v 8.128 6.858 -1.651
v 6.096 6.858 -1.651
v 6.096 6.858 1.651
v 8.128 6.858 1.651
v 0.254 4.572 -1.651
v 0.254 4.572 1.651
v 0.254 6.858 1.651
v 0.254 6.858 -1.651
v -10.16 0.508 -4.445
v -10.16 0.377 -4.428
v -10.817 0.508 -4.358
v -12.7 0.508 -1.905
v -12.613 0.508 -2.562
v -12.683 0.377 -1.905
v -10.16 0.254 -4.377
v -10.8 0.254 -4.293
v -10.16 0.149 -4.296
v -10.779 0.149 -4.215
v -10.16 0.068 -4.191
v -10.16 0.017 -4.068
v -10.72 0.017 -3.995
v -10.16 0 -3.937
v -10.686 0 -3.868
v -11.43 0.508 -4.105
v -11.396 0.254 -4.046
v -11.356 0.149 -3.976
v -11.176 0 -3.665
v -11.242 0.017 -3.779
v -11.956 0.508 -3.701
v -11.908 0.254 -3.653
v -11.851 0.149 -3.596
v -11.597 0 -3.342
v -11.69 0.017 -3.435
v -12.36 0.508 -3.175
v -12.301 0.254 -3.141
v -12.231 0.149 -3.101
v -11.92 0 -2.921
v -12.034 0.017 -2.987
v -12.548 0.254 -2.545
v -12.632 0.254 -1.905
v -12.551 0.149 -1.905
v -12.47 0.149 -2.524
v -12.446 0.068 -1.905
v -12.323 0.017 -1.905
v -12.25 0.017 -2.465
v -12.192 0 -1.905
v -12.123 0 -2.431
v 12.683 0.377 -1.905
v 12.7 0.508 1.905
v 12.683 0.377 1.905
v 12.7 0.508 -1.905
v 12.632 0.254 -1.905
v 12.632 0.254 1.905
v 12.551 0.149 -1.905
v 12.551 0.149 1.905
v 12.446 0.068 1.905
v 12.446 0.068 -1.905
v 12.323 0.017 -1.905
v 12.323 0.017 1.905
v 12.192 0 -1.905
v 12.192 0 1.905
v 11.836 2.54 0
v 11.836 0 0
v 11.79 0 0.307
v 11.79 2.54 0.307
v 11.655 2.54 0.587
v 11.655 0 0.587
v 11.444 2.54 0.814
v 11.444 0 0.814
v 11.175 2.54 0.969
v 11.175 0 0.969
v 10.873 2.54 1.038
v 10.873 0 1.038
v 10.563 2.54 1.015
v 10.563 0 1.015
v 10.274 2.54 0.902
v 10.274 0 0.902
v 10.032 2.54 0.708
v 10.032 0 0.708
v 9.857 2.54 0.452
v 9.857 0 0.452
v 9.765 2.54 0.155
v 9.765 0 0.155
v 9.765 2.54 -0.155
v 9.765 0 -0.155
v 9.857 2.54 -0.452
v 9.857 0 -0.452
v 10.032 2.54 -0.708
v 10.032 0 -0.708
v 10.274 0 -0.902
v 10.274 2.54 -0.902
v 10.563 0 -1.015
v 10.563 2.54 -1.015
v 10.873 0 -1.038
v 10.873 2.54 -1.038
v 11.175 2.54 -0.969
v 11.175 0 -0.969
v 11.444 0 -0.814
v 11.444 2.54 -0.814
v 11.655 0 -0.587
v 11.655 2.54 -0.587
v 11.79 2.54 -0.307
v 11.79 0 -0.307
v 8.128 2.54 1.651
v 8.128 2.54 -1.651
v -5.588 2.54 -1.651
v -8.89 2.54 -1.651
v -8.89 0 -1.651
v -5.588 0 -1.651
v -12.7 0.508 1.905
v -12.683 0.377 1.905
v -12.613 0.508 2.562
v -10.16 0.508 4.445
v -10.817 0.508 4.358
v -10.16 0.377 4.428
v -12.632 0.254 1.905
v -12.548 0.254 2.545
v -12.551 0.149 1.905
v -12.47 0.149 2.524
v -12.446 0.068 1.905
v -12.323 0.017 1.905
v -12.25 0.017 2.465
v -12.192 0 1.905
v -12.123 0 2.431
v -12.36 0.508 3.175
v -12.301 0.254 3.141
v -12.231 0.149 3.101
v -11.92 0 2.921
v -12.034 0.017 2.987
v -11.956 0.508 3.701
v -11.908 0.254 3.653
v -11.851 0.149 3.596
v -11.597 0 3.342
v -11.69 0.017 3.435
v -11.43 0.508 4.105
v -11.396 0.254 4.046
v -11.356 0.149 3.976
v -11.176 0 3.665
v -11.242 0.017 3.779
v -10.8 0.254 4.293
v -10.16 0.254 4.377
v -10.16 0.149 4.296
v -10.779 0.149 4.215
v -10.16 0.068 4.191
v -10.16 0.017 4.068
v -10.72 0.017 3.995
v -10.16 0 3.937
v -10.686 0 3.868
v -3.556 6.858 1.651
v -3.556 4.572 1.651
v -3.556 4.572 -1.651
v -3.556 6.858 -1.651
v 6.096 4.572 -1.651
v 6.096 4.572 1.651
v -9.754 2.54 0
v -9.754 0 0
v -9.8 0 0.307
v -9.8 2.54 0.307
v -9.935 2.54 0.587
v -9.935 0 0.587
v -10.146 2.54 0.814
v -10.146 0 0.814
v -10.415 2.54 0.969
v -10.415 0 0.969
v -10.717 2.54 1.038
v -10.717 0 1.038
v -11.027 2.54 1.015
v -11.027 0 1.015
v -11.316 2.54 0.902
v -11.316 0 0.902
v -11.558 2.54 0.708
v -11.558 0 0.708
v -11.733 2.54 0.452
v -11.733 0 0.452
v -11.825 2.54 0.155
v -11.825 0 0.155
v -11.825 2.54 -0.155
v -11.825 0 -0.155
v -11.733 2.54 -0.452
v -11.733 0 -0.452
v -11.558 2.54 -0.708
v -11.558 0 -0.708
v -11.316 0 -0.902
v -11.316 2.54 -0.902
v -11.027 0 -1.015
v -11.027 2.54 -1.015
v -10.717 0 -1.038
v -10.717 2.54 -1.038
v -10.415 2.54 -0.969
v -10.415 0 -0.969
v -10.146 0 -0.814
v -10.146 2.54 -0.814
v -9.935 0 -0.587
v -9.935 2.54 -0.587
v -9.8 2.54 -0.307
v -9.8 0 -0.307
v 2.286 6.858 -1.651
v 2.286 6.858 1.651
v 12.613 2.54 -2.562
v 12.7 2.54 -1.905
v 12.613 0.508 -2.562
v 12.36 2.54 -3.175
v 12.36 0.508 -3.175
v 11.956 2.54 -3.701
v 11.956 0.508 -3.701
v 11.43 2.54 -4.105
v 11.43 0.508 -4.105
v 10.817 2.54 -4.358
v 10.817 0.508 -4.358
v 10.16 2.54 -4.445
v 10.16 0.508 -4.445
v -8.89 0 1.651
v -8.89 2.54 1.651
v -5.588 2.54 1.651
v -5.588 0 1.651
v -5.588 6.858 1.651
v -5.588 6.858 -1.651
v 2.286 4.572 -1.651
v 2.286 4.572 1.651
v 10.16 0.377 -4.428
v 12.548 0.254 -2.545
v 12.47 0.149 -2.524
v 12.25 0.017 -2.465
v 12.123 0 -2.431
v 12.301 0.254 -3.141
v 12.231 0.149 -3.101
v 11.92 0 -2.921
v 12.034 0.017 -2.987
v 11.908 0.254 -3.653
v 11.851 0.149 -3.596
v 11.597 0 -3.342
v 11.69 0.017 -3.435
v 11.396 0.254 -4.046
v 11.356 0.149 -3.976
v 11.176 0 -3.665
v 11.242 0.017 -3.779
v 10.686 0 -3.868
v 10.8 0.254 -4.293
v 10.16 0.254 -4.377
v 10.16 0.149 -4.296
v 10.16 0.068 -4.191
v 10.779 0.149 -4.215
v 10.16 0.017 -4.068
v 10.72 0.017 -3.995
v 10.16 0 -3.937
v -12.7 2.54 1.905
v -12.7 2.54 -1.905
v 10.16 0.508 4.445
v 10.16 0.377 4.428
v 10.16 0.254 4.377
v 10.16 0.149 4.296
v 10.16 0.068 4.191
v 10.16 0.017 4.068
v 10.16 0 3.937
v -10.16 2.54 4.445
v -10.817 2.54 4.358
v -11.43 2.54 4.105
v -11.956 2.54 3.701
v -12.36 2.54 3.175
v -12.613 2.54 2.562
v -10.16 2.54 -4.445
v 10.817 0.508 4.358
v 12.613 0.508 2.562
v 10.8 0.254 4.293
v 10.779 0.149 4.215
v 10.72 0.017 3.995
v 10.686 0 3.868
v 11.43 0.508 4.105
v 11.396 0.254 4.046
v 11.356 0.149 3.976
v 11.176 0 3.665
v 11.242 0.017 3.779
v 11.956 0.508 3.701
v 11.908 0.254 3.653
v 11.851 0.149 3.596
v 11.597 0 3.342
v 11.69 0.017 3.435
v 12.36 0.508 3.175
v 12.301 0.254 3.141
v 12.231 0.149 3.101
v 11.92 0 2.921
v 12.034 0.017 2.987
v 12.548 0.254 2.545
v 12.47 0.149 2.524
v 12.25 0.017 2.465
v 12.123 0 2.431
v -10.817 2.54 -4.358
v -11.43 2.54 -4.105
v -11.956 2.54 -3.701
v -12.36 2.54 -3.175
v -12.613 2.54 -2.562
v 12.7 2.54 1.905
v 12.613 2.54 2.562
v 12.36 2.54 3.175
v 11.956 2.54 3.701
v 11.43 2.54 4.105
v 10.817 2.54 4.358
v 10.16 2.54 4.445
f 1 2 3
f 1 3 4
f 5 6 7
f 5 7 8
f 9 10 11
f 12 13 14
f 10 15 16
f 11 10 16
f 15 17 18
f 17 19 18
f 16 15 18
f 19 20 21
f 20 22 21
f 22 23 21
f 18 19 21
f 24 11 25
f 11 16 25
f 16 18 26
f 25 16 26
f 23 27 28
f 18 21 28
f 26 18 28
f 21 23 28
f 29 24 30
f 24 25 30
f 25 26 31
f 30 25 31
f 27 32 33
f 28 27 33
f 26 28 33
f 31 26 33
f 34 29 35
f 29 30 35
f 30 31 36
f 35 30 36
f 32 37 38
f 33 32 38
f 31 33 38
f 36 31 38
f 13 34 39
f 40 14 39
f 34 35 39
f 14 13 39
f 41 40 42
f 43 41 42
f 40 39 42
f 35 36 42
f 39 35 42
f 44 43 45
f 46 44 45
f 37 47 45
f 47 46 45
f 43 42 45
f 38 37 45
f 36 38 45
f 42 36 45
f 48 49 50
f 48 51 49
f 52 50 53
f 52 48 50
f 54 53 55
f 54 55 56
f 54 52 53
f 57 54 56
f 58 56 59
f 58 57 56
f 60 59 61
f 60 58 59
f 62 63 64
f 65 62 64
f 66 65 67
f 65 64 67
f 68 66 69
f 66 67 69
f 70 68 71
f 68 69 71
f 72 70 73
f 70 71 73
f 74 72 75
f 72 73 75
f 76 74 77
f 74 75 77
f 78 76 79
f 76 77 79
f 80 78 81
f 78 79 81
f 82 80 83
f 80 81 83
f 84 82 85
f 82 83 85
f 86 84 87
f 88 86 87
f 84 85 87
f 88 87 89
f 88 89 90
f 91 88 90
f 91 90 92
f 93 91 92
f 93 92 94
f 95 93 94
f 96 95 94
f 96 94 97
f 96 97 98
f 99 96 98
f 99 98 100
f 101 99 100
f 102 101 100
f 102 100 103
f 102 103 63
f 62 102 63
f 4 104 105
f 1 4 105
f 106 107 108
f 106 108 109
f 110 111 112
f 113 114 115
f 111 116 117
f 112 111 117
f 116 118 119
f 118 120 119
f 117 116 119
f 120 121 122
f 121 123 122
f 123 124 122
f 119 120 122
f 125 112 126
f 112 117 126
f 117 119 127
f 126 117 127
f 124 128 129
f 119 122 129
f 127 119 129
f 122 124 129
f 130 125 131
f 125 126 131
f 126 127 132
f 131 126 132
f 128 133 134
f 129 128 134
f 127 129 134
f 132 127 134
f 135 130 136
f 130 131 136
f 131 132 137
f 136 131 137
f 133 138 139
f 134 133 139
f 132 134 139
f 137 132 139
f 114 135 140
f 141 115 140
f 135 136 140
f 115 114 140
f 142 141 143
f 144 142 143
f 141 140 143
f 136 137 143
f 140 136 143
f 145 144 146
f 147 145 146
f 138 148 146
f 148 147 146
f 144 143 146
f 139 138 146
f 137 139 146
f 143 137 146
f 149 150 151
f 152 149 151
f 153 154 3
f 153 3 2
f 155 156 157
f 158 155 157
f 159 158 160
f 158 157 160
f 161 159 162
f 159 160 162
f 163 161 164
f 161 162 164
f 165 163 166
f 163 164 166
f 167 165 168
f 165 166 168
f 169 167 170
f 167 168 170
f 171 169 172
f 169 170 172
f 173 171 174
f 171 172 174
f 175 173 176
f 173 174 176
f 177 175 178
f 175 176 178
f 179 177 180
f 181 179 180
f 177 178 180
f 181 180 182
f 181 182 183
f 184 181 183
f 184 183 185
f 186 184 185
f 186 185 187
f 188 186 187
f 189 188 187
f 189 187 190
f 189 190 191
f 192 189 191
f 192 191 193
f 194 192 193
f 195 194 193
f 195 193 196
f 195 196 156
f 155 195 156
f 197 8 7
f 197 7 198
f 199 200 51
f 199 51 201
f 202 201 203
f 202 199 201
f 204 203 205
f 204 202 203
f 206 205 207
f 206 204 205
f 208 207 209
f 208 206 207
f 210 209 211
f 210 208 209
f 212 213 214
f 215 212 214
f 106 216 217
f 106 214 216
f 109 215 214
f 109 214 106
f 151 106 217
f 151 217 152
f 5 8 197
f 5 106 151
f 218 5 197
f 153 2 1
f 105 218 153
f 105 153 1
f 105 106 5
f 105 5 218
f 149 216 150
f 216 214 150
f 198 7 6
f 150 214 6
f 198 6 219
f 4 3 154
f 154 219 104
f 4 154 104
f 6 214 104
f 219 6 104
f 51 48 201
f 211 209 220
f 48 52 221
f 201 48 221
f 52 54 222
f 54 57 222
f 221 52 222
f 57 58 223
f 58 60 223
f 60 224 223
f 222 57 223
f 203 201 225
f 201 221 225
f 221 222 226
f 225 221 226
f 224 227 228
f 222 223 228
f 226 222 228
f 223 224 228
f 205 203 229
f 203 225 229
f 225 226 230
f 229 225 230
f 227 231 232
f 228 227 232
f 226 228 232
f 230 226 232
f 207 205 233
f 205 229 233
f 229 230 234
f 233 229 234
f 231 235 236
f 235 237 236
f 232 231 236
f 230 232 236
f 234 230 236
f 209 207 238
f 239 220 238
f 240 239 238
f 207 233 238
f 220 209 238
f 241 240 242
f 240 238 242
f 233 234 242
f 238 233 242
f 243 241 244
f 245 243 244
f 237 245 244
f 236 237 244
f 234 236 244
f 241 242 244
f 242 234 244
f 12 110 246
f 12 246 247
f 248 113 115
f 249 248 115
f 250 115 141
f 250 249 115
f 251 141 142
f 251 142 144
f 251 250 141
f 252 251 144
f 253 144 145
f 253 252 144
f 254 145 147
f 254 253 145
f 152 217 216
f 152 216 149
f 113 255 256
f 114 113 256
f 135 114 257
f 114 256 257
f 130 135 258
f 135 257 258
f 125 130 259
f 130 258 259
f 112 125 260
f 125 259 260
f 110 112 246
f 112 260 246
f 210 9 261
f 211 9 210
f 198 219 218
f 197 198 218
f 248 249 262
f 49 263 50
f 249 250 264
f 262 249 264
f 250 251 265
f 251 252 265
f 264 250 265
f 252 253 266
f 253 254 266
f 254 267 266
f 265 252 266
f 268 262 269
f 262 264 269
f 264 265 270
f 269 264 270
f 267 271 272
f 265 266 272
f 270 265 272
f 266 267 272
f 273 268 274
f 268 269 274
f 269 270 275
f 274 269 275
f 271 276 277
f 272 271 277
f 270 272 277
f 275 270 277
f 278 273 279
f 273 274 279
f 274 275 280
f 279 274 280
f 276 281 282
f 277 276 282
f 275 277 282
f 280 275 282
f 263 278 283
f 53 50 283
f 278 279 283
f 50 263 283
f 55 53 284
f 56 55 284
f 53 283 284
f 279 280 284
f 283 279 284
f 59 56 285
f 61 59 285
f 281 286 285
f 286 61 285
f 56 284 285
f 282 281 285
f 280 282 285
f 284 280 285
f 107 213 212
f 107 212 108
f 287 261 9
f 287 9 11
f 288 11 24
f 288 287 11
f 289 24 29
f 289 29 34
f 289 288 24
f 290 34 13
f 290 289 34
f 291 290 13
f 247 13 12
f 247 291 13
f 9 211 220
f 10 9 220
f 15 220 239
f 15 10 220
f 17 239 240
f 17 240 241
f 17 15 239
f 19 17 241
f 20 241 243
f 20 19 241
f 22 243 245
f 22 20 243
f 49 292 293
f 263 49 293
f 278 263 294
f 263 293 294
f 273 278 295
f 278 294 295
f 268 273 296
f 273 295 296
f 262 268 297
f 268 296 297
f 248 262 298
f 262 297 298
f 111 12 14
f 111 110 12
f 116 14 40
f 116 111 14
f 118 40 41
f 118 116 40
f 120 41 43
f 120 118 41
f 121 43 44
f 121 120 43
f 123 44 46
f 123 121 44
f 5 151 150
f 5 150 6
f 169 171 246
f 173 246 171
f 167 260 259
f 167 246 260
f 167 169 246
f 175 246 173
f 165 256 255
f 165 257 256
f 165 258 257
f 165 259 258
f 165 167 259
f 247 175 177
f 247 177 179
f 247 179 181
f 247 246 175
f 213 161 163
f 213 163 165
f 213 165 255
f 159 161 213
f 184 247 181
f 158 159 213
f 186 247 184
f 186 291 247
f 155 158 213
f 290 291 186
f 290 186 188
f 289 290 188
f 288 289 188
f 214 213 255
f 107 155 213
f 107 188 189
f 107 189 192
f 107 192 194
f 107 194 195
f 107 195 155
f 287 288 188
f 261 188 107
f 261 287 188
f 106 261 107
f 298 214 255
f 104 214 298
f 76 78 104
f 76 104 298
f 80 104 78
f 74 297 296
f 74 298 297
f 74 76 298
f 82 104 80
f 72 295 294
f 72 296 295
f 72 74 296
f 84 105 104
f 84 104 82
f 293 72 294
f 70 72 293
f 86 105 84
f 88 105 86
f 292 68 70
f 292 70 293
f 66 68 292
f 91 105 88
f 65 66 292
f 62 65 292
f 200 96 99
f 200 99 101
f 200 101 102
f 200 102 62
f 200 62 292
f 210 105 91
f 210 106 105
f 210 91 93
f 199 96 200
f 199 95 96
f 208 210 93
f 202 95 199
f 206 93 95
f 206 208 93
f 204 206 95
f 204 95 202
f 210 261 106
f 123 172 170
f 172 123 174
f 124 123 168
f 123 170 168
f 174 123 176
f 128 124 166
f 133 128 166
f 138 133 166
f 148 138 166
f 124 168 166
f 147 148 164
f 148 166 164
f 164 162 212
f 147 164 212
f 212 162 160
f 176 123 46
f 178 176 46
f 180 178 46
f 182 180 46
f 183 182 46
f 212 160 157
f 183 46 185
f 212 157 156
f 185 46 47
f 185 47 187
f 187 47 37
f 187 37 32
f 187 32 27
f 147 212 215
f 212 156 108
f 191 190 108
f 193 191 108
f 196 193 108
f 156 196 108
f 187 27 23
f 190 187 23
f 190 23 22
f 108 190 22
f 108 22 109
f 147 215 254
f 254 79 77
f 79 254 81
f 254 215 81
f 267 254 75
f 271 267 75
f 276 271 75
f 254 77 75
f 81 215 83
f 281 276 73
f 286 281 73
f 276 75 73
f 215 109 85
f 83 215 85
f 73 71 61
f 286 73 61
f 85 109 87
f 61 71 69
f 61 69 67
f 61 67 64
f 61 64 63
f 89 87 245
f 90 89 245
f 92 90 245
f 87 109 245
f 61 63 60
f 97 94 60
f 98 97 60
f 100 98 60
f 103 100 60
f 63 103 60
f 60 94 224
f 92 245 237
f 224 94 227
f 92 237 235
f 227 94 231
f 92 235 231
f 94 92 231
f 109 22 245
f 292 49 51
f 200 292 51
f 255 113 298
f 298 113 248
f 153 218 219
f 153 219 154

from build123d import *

# Parameters (mm, degrees)
SKETCH1_W           = 25.4
SKETCH1_H           = 8.89
BOSS_EXTRUDE1_DEPTH = 2.54
SKETCH2_W           = 17.018
SKETCH2_H           = 3.302
BOSS_EXTRUDE2_DEPTH = 2.032
SKETCH3_R           = 1.0414
CUT_EXTRUDE1_DEPTH  = 5.572
SKETCH4_W           = 3.302
SKETCH4_H           = 3.302
CUT_EXTRUDE2_DEPTH  = 4.572
SKETCH5_W           = 2.032
SKETCH5_H           = 3.302
BOSS_EXTRUDE3_DEPTH = 2.286
FILLET1_R           = 2.54
FILLET2_R           = 0.508


with BuildPart() as part:
    # Sketch1 → Boss-Extrude1 (new body)
    with BuildSketch(Plane(origin=(0, 0, 0), x_dir=(1, 0, 0), z_dir=(0, 1, 0))):
        Rectangle(SKETCH1_W, SKETCH1_H)
    extrude(amount=BOSS_EXTRUDE1_DEPTH)

    # Sketch2 → Boss-Extrude2 (add)
    with BuildSketch(Plane(origin=(0, 2.54, 0), x_dir=(1, 0, 0), z_dir=(0, 1, 0))):
        with Locations((-0.381, 0)):
            Rectangle(SKETCH2_W, SKETCH2_H)
    extrude(amount=BOSS_EXTRUDE2_DEPTH)

    # Sketch3 → Cut-Extrude1 (cut, through all)
    with BuildSketch(Plane.XZ):
        with Locations((-10.795, 0)):
            Circle(SKETCH3_R)
        with Locations((10.795, 0)):
            Circle(SKETCH3_R)
    extrude(amount=-CUT_EXTRUDE1_DEPTH, mode=Mode.SUBTRACT)

    # Sketch4 → Cut-Extrude2 (cut)
    with BuildSketch(Plane(origin=(0, 4.572, 0), x_dir=(1, 0, 0), z_dir=(0, 1, 0))):
        with Locations((-7.239, 0)):
            Rectangle(SKETCH4_W, SKETCH4_H)
    extrude(amount=-CUT_EXTRUDE2_DEPTH, mode=Mode.SUBTRACT)

    # Sketch5 → Boss-Extrude3 (add)
    with BuildSketch(Plane(origin=(0, 4.572, 0), x_dir=(1, 0, 0), z_dir=(0, 1, 0))):
        with Locations((-4.572, 0)):
            Rectangle(SKETCH5_W, SKETCH5_H)
        with Locations((1.27, 0)):
            Rectangle(SKETCH5_W, SKETCH5_H)
        with Locations((7.112, 0)):
            Rectangle(SKETCH5_W, SKETCH5_H)
    extrude(amount=BOSS_EXTRUDE3_DEPTH)

    # Fillet1
    fillet1_edges = [part.edges().sort_by_distance(p)[0] for p in [
        (12.7, 1.27, 4.445),
        (-12.7, 1.27, 4.445),
        (-12.7, 1.27, -4.445),
        (12.7, 1.27, -4.445),
    ]]
    fillet(fillet1_edges, radius=FILLET1_R)

    # Fillet2
    fillet2_edges = [part.edges().sort_by_distance(p)[0] for p in [
        (12.7, 0, 0),
        (0, 0, 4.445),
        (-12.7, 0, 0),
        (0, 0, -4.445),
        (-11.956051224, 0, -3.701051224),
        (-11.956051224, 0, 3.701051224),
        (11.956051224, 0, -3.701051224),
        (11.956051224, 0, 3.701051224),
    ]]
    fillet(fillet2_edges, radius=FILLET2_R)


solid = part.part
